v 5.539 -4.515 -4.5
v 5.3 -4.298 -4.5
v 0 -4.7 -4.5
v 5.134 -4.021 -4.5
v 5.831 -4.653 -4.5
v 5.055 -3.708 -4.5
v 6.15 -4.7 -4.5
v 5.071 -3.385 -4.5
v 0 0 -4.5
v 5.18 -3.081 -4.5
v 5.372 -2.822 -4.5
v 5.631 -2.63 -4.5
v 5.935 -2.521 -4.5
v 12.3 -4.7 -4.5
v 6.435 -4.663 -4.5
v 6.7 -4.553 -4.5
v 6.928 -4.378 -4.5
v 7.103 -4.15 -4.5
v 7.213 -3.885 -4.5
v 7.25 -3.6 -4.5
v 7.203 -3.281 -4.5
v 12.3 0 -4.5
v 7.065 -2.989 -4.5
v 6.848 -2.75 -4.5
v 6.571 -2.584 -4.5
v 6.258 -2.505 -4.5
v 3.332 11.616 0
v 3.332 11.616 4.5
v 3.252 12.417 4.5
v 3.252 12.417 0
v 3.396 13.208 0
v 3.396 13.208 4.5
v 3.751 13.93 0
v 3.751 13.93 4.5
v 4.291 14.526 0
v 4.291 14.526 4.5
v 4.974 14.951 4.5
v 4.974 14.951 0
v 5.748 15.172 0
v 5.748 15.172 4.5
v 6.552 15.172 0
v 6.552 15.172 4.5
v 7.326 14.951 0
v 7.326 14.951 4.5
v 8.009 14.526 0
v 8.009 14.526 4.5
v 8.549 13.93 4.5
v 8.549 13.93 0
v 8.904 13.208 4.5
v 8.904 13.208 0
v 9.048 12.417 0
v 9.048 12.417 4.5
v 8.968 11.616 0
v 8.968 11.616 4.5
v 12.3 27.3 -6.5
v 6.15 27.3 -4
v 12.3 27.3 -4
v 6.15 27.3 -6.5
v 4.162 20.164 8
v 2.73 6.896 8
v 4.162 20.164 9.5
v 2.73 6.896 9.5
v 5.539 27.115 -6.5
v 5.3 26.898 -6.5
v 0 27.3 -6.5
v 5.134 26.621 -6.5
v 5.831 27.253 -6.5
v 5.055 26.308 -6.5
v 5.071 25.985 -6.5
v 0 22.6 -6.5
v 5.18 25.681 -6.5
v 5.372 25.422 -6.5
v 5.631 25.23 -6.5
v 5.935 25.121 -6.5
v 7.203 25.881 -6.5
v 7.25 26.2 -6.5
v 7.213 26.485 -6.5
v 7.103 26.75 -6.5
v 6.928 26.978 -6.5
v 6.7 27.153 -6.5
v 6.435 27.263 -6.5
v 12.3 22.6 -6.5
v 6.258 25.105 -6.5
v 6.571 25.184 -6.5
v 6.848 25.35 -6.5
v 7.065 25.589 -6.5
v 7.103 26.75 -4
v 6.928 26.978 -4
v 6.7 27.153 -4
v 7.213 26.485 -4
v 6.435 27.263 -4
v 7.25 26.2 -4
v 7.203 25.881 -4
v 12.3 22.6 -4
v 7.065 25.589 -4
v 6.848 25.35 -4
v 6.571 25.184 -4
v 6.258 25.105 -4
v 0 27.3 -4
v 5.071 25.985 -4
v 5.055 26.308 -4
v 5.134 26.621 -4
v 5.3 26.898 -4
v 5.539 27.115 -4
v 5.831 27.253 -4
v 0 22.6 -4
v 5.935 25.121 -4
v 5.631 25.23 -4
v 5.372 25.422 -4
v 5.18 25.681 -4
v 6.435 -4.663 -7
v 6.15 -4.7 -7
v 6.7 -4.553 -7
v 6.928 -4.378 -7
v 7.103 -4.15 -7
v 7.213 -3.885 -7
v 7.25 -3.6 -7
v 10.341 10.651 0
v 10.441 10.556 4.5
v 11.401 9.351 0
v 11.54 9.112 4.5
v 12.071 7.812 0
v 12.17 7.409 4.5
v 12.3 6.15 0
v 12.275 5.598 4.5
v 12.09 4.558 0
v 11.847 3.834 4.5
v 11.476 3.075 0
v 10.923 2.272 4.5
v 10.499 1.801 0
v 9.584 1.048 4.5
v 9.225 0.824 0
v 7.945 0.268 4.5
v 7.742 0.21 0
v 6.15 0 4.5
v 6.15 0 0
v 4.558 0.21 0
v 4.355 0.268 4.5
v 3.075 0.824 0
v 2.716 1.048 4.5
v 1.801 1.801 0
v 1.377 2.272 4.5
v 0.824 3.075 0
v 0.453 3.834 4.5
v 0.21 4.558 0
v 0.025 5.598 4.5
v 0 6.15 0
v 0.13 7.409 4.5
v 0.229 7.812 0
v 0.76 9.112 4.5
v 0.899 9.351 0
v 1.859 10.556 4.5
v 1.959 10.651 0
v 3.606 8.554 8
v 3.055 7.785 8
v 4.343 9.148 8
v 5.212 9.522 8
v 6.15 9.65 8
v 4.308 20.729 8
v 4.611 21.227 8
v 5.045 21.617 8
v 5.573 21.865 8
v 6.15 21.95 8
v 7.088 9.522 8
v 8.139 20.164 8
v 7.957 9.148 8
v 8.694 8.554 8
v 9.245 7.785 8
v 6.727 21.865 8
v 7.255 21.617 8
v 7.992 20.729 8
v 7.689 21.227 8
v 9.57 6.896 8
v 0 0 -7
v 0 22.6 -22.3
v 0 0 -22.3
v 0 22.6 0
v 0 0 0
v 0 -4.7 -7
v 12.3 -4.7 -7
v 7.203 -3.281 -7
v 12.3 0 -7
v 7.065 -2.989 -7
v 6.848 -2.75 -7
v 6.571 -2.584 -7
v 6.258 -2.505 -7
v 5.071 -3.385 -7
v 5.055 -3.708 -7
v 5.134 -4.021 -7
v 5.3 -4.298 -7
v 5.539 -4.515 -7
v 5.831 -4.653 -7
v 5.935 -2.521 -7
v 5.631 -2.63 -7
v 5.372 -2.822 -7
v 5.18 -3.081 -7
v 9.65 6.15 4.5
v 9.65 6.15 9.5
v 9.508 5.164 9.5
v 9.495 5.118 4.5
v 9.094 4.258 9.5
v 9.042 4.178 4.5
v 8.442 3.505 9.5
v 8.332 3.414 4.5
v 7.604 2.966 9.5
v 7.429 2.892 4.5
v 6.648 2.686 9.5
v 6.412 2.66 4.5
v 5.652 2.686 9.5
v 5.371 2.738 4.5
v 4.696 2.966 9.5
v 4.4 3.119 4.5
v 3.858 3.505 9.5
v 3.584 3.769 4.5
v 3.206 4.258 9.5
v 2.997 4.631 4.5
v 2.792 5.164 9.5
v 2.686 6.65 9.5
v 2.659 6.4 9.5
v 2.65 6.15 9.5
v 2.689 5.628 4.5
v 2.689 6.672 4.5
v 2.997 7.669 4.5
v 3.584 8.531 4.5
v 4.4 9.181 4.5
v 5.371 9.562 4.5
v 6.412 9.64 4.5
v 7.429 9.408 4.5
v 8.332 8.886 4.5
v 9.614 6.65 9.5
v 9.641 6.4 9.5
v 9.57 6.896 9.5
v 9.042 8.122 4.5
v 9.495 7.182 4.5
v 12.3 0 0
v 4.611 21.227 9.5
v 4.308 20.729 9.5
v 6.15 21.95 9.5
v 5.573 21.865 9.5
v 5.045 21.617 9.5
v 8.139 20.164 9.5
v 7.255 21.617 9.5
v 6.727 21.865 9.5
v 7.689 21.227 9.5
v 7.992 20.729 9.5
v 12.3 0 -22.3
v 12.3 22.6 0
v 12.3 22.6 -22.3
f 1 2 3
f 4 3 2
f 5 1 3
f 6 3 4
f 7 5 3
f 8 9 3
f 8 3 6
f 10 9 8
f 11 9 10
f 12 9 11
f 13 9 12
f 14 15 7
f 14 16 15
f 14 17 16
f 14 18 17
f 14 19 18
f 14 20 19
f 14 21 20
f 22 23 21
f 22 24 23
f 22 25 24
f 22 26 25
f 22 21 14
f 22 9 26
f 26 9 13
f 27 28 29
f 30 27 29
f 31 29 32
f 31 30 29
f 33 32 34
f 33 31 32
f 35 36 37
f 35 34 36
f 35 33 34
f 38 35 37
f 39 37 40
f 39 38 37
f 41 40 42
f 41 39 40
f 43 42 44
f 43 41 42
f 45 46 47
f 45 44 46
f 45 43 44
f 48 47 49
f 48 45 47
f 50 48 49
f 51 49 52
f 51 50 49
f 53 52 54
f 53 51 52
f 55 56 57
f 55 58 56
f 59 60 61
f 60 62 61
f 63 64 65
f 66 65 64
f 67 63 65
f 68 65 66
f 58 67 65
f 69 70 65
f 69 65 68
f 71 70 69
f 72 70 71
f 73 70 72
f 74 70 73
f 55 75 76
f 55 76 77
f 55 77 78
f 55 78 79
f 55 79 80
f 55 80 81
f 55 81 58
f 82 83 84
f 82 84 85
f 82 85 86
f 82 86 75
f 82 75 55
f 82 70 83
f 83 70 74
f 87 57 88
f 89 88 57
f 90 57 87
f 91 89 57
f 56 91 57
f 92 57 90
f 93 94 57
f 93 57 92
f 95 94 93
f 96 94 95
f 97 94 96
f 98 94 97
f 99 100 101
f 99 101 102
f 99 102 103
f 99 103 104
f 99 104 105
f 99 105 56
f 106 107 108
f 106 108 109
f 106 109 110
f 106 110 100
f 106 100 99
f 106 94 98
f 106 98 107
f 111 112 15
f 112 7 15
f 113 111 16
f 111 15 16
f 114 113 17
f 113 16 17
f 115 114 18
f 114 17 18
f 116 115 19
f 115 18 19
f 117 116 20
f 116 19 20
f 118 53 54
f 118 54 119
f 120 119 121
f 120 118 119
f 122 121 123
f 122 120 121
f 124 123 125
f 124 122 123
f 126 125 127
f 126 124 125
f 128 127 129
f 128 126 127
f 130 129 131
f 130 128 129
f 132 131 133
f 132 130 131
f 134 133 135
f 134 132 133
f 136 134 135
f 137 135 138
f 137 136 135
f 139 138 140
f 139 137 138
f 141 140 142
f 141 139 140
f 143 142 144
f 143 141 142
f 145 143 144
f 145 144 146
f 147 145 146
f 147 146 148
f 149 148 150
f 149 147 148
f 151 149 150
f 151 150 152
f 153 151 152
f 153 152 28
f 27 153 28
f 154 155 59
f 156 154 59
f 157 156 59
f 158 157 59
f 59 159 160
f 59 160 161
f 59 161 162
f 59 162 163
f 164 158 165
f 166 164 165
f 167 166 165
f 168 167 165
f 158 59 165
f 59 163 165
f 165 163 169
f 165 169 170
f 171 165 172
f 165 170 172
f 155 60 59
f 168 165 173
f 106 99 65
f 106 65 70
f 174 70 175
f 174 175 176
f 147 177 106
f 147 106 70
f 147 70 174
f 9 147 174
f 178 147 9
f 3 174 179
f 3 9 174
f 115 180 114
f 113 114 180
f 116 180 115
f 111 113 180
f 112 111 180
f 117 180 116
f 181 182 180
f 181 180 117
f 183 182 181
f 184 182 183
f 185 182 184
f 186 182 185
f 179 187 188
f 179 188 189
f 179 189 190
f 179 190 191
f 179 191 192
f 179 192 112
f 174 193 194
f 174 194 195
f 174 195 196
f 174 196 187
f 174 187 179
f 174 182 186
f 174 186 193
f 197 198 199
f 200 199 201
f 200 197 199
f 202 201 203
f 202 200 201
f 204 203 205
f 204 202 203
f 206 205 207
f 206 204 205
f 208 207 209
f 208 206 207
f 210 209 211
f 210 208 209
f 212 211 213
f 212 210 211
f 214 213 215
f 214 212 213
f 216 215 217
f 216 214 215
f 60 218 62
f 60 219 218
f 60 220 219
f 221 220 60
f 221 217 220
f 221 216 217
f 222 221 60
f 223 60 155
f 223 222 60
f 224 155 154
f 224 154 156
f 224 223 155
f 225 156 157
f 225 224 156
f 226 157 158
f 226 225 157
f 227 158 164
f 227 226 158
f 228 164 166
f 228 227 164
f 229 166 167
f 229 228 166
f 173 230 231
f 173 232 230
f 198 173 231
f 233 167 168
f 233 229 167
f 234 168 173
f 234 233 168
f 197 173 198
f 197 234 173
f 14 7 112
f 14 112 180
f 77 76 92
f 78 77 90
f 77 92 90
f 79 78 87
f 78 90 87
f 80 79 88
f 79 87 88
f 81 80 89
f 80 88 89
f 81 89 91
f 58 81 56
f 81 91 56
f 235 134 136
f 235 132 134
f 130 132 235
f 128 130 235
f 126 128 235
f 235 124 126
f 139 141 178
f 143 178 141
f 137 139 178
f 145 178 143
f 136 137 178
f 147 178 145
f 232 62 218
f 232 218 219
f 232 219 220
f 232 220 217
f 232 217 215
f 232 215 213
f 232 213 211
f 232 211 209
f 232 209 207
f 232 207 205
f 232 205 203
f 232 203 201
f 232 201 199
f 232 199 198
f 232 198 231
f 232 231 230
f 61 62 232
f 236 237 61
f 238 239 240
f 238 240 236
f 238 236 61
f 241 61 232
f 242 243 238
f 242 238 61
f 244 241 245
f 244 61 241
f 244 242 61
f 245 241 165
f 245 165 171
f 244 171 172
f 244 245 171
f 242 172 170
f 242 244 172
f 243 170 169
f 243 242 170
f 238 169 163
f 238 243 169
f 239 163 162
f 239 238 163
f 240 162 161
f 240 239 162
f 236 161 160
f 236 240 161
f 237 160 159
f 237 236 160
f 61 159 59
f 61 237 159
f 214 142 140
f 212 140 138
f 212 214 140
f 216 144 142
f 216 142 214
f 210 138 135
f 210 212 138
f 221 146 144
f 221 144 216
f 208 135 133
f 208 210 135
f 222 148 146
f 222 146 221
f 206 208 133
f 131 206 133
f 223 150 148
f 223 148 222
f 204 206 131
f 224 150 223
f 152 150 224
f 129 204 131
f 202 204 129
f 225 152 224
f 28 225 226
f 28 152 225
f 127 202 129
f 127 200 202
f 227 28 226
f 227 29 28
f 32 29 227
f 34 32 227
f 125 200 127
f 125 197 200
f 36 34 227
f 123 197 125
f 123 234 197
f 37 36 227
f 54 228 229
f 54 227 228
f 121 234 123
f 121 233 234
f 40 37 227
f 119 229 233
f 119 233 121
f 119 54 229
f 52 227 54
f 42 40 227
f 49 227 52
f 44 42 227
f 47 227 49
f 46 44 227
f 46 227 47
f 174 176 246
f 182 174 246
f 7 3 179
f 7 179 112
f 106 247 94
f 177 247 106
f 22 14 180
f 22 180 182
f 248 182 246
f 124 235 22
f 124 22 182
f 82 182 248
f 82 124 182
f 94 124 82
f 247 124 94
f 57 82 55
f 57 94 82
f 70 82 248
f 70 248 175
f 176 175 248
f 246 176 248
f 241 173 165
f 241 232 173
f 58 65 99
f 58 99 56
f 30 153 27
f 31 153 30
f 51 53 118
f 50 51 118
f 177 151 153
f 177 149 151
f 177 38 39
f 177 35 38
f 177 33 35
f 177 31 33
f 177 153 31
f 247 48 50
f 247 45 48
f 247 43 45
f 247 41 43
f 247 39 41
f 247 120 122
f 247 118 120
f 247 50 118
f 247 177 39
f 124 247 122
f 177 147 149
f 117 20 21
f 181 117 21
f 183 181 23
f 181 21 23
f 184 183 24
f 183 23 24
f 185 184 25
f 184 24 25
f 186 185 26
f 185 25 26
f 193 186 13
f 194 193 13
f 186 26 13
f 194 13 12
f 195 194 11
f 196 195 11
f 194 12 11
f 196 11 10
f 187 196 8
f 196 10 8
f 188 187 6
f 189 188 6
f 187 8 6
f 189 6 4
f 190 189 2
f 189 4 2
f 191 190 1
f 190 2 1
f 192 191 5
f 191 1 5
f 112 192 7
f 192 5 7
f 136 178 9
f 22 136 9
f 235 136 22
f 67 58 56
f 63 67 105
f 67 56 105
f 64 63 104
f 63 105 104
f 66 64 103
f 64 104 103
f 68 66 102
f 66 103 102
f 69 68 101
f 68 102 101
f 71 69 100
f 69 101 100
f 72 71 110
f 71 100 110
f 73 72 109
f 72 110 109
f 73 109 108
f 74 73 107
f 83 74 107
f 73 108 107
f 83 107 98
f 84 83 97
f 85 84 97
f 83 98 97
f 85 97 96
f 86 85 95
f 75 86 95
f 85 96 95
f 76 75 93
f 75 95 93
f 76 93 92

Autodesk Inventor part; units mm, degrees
ref_plane "YZ Plane" through (0, 0, 0) normal (1, 0, 0) x (0, 1, 0)
ref_plane "XZ Plane" through (0, 0, 0) normal (0, 1, 0) x (-1, 0, 0)
ref_plane "XY Plane" through (0, 0, 0) normal (0, 0, 1) x (1, 0, 0)
sketch "Sketch1" plane through (0, 0, 0) normal (0, 0, 1) x (1, 0, 0)
  line L0 (0, 0) -> (12.3, 0)
  line L1 (12.3, 0) -> (12.3, 22.6)
  line L2 (12.3, 22.6) -> (0, 22.6)
  line L3 (0, 22.6) -> (0, 0)
  line L4 (6.15, 22.6) -> (6.15, 0) construction
  arc A0 (3.3318, 11.6163) -> (8.9682, 11.6163) centre (6.15, 6.15) ccw
  arc A1 (8.9682, 11.6163) -> (3.3318, 11.6163) centre (6.15, 12.3) ccw
  dimension "d0" = 12.3
  dimension "d1" = 22.6
  dimension "d2" = 6.15
  dimension "d3" = 6.15
  dimension "d4" = 5.8
extrude "Extrusion1" add sketch "Sketch1" against normal blind 22.3
sketch "Sketch2" plane through (0, 0, 0) normal (0, 0, 1) x (1, 0, 0)
  line L0 (0, 0) -> (12.3, 0)
  line L1 (12.3, 0) -> (12.3, 22.6)
  line L2 (12.3, 22.6) -> (0, 22.6)
  line L3 (0, 22.6) -> (0, 0)
  line L4 (6.15, 22.6) -> (6.15, 0) construction
  arc A0 (3.3318, 11.6163) -> (8.9682, 11.6163) centre (6.15, 6.15) ccw
  arc A1 (8.9682, 11.6163) -> (3.3318, 11.6163) centre (6.15, 12.3) ccw
  dimension "d7" = 12.3
  dimension "d8" = 22.6
  dimension "d9" = 6.15
  dimension "d10" = 6.15
  dimension "d11" = 5.8
extrude "Extrusion2" add sketch "Sketch2" along normal blind 4.5 contours A0 A1
sketch "Sketch3" plane through (0, 22.6, 0) normal (0, 1, 0) x (1, 0, 0)
  line L0 (12.3, 0) -> (0, 0) construction
  line L1 (12.3, 0) -> (12.3, 22.3) construction
  line L2 (0, 0) -> (0, 22.3) construction
  line L3 (12.3, 4) -> (0, 4)
  line L4 (0, 4) -> (0, 6.5)
  line L5 (0, 6.5) -> (12.3, 6.5)
  line L6 (12.3, 6.5) -> (12.3, 4)
  dimension "d14" = 4
  dimension "d15" = 2.5
extrude "Extrusion3" add sketch "Sketch3" along normal blind 4.7
sketch "Sketch4" plane through (0, 0, -22.3) normal (0, -1, 0) x (1, 0, 0)
  line L0 (12.3, 15.3) -> (0, 15.3)
  line L1 (0, 15.3) -> (0, 17.8)
  line L2 (0, 17.8) -> (12.3, 17.8)
  line L3 (12.3, 17.8) -> (12.3, 15.3)
  line L4 (0, 22.3) -> (6.15, 22.3) construction
  line L5 (0, 22.3) -> (0, 0) construction
  line L6 (12.3, 0) -> (0, 0) construction
  line L7 (12.3, 22.3) -> (12.3, 0) construction
  line L8 (6.15, 22.3) -> (12.3, 22.3) construction
  dimension "d19" = 2.5
  dimension "d20" = 4.5
extrude "Extrusion4" add sketch "Sketch4" along normal blind 4.7
sketch "Sketch5" plane through (0, 22.6, -4) normal (0, 0, 1) x (1, 0, 0)
  line L0 (12.3, 0) -> (0, 0) construction
  line L1 (12.3, 0) -> (12.3, 4.7) construction
  line L2 (0, 4.7) -> (12.3, 4.7) construction
  line L3 (0, 0) -> (0, 4.7) construction
  line L4 (0, 4.7) -> (12.3, 4.7) projected
  line L5 (6.15, 4.7) -> (6.15, 0)
  circle A0 centre (6.15, 3.6) radius 1.1
  point P0 (0, -22.6)
  dimension "d23" = 1.1
extrude "Extrusion5" cut sketch "Sketch5" against normal blind 10
sketch "Sketch6" plane through (0, 0, -4.5) normal (0, 0, 1) x (1, 0, 0)
  line L0 (0, 0) -> (12.3, 0) construction
  line L1 (0, 0) -> (0, -4.7) construction
  line L2 (12.3, -4.7) -> (0, -4.7) construction
  line L3 (12.3, 0) -> (12.3, -4.7) construction
  line L4 (0, -4.7) -> (12.3, -4.7) construction
  line L5 (6.15, -4.7) -> (6.15, 0) construction
  line L6 (12.3, 0) -> (0, 0) construction
  circle A0 centre (6.15, -3.6) radius 1.1
  dimension "d26" = 1.1
extrude "Extrusion6" cut sketch "Sketch6" against normal blind 10
sketch "Sketch7" plane through (0, 0, 4.5) normal (0, 0, 1) x (1, 0, 0)
  arc A0 (3.3318, 11.6163) -> (8.9682, 11.6163) centre (6.15, 6.15) ccw projected
  arc A1 (8.9682, 11.6163) -> (3.3318, 11.6163) centre (6.15, 12.3) ccw projected
  circle A2 centre (6.15, 6.15) radius 3.5
  point P0 (0, 0)
  dimension "d29" = 7
extrude "Extrusion7" add sketch "Sketch7" along normal blind 5 contours A2
sketch "Sketch8" plane through (6.15, 6.15, 9.5) normal (0, 0, 1) x (1, 0, 0)
  circle A0 centre (0, 0) radius 3.5 construction
  line L0 (0, 0) -> (0, 13.1535)
  circle A1 centre (0, 0) radius 3.5 construction
  arc A2 (1.9885, 14.0145) -> (-1.9885, 14.0145) centre (0, 13.8) ccw
  line L1 (-3.5, 0) -> (-1.9885, 14.0145)
  line L2 (3.5, 0) -> (1.9885, 14.0145)
  line L3 (0, -12.2559) -> (0, 3.5)
  line L4 (0, 15.8) -> (0, 18.1002)
  line L5 (3.5, 0) -> (-3.5, 0)
  point P0 (-6.15, -6.15)
  point P1 (0, -3.5)
  dimension "d32" = 19.3
  dimension "d33" = 2
extrude "Extrusion8" add sketch "Sketch8" against normal blind 1.5
properties part number "Servo"
